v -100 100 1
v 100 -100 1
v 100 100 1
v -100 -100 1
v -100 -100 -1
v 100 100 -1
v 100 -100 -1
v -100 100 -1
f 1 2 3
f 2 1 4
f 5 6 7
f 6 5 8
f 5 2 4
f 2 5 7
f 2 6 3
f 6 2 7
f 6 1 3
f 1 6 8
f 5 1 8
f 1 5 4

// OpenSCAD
$fn = 64;

length = 200;
width  = 200;
thickness = 2;

// Ensure a clearly visible, non-zero sheet thickness
t = max(thickness, 2);

cube([length, width, t], center=true);
